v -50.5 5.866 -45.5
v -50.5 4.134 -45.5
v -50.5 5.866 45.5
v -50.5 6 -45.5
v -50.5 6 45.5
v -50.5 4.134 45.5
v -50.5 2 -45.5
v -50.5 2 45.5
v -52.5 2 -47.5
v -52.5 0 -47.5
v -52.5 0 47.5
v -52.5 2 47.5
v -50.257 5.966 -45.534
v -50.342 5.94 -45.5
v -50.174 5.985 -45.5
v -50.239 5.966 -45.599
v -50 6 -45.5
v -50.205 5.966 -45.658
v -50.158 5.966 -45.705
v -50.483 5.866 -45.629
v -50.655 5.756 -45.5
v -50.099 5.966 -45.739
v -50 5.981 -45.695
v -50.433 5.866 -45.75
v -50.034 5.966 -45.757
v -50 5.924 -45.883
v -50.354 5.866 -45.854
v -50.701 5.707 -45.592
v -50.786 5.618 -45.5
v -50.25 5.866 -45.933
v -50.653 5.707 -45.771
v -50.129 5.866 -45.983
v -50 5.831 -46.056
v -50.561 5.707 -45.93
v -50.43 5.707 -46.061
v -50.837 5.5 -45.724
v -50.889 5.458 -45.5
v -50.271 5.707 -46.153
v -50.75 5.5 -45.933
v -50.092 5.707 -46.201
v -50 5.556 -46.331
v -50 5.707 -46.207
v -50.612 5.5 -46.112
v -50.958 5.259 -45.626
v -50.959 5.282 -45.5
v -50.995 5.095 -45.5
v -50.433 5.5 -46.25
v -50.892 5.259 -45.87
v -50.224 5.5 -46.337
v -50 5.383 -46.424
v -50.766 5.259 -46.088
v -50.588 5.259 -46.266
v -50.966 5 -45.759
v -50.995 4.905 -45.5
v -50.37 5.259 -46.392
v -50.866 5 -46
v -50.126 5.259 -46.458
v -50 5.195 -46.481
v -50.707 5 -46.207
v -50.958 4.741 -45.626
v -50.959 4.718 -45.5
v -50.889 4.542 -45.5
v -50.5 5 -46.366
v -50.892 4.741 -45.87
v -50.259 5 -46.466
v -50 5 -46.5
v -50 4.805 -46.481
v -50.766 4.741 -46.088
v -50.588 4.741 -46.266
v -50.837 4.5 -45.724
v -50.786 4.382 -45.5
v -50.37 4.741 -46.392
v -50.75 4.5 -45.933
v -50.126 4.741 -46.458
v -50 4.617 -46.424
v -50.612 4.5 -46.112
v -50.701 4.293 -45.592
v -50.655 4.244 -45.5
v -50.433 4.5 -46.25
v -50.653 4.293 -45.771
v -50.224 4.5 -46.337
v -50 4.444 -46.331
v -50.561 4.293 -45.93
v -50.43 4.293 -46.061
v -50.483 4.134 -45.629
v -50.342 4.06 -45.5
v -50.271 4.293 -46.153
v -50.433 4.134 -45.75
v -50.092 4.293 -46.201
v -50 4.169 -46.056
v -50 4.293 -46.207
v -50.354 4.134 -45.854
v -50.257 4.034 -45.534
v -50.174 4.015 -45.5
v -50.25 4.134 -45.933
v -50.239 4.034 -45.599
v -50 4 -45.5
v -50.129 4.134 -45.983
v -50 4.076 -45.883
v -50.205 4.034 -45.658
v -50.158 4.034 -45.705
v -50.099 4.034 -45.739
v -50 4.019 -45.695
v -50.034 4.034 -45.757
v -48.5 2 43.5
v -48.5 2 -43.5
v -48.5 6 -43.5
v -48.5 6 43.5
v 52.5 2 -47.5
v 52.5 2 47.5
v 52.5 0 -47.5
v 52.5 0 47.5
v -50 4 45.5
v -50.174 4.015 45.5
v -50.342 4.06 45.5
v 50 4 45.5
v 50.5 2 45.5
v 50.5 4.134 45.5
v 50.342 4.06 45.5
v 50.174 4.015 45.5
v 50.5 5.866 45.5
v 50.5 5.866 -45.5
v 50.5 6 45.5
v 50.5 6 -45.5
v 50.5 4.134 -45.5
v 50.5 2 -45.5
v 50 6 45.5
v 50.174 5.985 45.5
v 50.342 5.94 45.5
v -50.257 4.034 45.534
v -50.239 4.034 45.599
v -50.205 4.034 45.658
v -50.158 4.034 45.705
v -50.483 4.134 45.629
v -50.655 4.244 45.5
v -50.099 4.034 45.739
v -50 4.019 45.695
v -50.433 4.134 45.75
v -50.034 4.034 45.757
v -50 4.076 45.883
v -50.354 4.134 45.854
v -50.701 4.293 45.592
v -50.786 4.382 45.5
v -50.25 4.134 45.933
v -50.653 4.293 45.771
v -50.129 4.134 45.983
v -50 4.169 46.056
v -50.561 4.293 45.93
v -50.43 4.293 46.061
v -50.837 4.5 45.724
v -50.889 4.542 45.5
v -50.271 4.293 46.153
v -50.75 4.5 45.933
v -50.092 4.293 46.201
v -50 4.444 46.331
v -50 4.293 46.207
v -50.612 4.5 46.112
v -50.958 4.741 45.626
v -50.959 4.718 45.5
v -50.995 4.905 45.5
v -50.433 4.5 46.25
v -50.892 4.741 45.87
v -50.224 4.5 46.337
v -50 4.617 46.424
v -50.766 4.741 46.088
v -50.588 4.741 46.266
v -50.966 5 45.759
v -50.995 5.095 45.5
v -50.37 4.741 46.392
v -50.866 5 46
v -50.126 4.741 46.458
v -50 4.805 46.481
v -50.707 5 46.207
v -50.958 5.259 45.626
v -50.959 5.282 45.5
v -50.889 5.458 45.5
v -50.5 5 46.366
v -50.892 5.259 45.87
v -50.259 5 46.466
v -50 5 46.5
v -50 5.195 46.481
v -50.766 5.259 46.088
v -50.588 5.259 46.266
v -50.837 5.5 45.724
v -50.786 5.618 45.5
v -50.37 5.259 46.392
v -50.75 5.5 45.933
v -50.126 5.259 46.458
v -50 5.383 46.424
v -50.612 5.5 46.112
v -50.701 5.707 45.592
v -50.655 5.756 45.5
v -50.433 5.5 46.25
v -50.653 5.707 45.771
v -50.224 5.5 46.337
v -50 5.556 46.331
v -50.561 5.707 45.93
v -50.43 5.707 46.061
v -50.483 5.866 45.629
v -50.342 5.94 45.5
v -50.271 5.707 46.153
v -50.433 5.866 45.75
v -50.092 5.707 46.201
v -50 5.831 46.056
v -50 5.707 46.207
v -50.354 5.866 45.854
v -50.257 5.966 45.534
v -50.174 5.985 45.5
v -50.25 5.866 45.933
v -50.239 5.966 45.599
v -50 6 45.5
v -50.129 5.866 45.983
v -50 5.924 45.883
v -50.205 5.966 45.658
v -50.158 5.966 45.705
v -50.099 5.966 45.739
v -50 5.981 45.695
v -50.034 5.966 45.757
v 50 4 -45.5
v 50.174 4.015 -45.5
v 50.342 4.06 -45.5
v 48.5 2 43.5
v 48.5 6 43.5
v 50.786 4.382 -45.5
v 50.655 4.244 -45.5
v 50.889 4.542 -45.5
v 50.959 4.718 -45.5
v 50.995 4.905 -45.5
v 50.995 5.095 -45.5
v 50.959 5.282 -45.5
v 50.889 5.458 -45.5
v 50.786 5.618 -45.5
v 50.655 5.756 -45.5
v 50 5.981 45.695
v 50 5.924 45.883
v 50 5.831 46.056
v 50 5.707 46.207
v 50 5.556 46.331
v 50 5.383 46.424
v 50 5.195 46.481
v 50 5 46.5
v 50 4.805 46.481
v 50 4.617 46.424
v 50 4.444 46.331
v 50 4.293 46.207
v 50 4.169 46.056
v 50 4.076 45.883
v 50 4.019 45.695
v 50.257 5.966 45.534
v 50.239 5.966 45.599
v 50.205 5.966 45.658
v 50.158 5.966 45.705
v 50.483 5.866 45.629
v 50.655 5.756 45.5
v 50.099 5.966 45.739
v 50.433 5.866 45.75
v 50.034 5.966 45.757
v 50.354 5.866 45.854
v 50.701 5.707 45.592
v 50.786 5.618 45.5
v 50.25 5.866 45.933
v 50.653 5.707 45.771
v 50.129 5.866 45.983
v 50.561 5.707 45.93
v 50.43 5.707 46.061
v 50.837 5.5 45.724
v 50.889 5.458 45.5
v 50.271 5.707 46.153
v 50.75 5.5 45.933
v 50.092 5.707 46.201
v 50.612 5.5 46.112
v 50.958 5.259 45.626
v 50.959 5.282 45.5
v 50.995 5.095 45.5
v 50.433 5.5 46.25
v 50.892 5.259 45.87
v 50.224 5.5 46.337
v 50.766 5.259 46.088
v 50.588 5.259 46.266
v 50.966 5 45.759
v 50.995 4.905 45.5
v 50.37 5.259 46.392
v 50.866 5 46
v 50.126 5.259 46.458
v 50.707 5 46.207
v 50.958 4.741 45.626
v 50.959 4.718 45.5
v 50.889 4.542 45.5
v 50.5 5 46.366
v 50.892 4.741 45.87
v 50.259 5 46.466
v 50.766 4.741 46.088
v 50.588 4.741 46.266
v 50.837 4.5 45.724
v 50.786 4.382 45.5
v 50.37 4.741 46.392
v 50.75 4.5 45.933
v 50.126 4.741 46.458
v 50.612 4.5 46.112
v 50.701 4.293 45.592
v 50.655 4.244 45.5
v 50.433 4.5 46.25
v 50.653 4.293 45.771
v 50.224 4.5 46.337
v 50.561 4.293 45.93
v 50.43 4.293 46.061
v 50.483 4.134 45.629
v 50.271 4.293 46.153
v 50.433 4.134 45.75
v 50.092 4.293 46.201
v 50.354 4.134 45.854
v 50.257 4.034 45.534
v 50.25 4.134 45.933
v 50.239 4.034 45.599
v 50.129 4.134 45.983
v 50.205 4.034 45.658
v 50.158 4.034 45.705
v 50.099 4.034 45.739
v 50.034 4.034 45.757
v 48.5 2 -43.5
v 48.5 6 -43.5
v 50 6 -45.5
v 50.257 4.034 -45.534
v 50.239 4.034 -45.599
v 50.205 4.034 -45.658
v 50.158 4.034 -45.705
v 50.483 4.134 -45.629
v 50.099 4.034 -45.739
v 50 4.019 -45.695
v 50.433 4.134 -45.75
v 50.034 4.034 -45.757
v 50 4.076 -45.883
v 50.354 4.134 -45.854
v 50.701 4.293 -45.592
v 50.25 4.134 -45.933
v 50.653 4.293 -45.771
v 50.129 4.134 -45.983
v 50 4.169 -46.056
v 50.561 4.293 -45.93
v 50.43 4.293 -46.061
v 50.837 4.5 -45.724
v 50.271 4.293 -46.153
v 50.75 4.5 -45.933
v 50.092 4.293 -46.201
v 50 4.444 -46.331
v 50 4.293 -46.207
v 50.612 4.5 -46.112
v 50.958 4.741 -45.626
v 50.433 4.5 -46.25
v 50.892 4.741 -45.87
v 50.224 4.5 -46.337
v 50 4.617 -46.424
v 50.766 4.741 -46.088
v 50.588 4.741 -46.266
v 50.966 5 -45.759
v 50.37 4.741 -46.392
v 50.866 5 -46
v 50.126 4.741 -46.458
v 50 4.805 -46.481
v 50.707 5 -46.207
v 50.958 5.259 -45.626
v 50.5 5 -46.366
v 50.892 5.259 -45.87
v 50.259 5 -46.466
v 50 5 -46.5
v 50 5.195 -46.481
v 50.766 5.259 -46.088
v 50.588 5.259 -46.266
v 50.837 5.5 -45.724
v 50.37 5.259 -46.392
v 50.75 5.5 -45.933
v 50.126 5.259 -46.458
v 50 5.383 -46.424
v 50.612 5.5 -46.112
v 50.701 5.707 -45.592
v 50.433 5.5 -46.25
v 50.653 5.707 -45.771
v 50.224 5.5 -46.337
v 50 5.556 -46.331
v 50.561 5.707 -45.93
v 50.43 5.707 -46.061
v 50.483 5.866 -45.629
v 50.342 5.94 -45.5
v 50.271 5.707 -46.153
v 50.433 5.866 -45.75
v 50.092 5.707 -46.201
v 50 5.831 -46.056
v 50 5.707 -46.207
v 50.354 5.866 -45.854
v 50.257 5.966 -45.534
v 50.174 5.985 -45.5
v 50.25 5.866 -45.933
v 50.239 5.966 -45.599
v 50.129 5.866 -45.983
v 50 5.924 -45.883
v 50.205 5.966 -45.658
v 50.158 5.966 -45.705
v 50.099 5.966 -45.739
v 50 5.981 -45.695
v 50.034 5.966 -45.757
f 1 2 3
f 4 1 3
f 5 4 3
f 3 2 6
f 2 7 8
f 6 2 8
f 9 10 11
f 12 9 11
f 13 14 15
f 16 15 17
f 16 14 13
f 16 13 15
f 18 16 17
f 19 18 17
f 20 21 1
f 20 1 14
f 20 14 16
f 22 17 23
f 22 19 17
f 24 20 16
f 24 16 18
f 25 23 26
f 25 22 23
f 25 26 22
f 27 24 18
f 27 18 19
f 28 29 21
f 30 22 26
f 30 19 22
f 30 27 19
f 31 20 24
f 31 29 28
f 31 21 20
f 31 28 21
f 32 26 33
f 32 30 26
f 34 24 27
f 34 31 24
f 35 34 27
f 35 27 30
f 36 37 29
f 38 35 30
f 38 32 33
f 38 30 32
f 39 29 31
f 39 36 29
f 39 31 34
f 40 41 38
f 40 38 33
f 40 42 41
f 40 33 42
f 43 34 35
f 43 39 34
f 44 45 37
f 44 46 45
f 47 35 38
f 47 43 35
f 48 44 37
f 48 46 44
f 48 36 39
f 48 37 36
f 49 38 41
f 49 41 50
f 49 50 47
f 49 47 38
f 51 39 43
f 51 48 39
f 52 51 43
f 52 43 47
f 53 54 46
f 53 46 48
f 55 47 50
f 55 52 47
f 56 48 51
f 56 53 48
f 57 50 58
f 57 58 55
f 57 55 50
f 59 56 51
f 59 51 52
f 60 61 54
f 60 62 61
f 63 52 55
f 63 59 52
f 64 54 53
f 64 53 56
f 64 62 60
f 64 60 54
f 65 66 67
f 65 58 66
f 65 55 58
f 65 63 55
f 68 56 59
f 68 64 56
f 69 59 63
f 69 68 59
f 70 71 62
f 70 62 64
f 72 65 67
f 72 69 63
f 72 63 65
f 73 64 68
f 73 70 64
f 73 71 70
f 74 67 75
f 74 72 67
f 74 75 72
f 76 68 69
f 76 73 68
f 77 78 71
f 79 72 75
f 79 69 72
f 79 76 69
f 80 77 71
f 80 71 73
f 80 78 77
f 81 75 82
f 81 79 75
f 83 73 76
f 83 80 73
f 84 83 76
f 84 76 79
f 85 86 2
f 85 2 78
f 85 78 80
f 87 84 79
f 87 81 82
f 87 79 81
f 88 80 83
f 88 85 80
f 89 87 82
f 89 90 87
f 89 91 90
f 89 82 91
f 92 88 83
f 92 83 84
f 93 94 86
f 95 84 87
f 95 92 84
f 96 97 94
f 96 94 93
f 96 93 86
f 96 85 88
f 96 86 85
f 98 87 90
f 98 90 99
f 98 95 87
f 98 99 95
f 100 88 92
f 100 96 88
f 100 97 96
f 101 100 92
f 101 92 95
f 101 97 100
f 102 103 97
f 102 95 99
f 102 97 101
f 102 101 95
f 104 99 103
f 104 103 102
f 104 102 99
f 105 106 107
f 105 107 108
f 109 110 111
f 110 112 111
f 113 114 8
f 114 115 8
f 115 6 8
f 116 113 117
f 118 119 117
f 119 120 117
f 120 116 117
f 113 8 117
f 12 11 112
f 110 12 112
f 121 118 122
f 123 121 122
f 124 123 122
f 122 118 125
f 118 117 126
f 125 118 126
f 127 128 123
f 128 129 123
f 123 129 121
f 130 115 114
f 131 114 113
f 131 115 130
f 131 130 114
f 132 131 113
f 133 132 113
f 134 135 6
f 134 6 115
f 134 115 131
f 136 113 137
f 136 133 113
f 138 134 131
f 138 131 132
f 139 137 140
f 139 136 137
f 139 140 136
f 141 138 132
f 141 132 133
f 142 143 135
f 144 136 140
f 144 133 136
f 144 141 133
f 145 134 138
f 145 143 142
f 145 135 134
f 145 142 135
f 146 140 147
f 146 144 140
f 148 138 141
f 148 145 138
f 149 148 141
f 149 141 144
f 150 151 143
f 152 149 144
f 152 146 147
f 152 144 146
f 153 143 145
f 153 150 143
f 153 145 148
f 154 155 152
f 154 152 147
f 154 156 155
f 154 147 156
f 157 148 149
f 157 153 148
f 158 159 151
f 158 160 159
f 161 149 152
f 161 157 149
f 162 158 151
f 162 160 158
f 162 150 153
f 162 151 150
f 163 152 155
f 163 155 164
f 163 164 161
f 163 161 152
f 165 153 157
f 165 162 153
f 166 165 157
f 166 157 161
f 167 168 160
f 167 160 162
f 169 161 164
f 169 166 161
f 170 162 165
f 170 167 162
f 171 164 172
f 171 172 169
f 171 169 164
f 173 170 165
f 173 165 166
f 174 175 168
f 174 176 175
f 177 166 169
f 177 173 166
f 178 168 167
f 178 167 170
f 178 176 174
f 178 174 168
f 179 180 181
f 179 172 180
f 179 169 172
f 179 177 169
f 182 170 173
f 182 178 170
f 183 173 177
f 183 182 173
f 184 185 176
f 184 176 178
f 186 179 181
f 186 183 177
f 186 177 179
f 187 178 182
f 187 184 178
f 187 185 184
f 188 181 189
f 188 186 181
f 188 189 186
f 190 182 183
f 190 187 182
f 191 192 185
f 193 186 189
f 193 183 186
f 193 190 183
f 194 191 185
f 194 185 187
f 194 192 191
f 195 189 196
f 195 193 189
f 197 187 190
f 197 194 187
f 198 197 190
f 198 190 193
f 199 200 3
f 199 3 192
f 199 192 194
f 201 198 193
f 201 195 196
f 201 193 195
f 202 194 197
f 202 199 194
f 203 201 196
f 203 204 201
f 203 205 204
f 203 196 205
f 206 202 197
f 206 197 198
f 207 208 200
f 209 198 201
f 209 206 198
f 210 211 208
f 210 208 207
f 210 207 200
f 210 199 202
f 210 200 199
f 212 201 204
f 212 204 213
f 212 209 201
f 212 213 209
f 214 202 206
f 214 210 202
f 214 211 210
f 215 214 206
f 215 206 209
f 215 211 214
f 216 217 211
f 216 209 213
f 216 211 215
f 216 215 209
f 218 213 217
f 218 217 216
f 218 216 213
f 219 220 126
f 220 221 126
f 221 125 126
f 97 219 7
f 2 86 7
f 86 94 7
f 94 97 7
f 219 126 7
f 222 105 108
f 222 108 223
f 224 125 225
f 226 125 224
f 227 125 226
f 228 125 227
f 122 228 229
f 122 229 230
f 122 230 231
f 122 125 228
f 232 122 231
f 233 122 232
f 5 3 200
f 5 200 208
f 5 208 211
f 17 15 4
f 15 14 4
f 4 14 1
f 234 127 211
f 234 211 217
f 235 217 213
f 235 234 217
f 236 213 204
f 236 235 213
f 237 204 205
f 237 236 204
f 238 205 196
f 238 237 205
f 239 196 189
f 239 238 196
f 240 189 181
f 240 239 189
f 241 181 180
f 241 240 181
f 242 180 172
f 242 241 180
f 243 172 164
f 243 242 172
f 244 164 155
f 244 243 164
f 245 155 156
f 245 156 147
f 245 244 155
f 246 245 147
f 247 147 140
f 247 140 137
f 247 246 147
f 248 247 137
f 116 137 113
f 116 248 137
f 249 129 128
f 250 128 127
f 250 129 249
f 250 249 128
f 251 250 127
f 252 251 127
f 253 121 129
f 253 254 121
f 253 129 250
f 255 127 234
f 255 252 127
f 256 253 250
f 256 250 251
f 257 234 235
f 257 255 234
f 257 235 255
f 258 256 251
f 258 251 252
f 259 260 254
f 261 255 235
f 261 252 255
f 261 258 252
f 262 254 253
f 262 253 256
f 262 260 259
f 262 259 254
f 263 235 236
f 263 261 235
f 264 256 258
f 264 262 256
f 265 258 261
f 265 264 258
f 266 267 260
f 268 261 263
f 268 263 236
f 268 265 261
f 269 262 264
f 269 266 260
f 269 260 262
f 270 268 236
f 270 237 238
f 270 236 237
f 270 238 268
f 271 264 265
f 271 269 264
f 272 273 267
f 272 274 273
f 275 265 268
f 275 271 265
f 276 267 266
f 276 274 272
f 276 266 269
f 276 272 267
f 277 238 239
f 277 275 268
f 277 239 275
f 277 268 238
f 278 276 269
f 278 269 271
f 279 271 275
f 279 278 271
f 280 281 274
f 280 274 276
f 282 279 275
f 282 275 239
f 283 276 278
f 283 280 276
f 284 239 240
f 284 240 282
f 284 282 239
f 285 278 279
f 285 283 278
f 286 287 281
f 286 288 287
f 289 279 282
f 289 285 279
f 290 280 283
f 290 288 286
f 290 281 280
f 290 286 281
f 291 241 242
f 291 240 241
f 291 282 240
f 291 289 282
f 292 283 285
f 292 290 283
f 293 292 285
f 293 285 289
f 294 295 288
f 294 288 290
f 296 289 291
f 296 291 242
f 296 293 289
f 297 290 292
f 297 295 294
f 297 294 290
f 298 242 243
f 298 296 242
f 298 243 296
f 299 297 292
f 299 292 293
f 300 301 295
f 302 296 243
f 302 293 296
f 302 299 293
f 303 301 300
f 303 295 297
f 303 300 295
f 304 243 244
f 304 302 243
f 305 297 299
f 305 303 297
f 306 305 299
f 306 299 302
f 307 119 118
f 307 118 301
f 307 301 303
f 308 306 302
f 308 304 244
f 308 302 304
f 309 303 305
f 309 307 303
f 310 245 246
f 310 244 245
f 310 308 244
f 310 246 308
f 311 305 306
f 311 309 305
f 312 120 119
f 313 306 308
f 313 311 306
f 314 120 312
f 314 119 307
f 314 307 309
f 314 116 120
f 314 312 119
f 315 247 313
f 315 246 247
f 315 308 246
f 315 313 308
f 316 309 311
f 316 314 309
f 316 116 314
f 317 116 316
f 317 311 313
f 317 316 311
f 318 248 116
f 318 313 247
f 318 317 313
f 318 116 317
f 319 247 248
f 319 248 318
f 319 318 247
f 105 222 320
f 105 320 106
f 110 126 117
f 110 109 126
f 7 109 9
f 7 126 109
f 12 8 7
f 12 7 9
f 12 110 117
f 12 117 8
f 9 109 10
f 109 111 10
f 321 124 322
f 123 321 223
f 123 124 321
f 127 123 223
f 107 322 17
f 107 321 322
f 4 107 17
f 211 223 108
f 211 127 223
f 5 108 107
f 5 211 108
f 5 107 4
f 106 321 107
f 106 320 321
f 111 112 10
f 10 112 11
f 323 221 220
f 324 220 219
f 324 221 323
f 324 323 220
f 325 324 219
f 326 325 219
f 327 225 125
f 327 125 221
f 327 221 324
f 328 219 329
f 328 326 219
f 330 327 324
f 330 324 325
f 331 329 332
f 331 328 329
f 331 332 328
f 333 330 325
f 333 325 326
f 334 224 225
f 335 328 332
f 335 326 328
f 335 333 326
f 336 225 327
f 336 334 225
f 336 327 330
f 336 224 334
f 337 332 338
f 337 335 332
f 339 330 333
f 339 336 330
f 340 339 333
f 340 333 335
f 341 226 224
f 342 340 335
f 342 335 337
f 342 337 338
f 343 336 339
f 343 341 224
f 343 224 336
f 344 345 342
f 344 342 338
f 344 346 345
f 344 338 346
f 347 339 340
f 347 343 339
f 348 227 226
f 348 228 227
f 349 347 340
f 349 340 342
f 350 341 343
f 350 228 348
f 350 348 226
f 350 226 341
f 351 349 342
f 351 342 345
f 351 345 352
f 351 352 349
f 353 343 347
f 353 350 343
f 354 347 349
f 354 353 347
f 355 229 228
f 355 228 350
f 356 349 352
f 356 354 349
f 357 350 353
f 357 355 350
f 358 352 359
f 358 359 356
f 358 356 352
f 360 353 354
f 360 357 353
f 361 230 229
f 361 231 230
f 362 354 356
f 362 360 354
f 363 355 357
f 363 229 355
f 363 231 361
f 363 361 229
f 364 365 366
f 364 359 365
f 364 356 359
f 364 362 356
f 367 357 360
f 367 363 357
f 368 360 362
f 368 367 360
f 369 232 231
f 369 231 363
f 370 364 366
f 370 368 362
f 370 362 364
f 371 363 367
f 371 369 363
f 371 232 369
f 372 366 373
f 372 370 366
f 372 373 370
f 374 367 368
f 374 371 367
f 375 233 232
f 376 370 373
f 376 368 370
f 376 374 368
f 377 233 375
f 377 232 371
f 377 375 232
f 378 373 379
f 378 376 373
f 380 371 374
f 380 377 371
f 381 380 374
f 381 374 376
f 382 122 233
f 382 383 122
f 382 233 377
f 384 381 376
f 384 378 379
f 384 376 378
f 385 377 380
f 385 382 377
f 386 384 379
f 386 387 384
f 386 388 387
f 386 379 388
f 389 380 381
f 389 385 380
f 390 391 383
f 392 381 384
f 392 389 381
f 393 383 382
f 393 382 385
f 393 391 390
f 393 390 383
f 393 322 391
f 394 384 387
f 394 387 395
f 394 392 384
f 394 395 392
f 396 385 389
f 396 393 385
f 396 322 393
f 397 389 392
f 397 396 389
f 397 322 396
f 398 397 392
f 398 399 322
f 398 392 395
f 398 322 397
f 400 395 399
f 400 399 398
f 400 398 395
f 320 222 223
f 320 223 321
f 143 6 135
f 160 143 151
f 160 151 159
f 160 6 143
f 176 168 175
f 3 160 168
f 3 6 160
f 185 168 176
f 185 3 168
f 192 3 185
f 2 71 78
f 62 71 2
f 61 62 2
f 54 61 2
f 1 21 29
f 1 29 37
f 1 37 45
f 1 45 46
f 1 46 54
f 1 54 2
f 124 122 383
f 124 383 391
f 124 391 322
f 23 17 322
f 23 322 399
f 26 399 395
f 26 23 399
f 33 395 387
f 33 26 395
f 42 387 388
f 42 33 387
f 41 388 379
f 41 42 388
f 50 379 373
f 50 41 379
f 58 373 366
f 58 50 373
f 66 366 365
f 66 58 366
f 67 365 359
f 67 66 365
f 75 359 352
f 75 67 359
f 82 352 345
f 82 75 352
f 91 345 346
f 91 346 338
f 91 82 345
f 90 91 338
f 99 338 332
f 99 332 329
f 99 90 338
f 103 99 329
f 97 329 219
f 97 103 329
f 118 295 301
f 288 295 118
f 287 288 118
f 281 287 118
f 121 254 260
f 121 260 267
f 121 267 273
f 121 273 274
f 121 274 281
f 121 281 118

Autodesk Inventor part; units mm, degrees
ref_plane "YZ Plane" through (0, 0, 0) normal (1, 0, 0) x (0, 1, 0)
ref_plane "XZ Plane" through (0, 0, 0) normal (0, 1, 0) x (-1, 0, 0)
ref_plane "XY Plane" through (0, 0, 0) normal (0, 0, 1) x (1, 0, 0)
sketch "Master_XZ" plane through (0, 0, 0) normal (0, 1, 0) x (-1, 0, 0)
  line L0 (52.5, 47.5) -> (-52.5, 47.5)
  line L1 (-52.5, 47.5) -> (-52.5, -47.5)
  line L2 (-52.5, -47.5) -> (52.5, -47.5)
  line L3 (52.5, -47.5) -> (52.5, 47.5)
  line L4 (52.5, 47.5) -> (-52.5, -47.5) construction
  line L5 (-52.5, 47.5) -> (52.5, -47.5) construction
  line L6 (50.5, 45.5) -> (-50.5, 45.5)
  line L7 (-50.5, 45.5) -> (-50.5, -45.5)
  line L8 (-50.5, -45.5) -> (50.5, -45.5)
  line L9 (50.5, -45.5) -> (50.5, 45.5)
  line L10 (48.5, 43.5) -> (-48.5, 43.5)
  line L11 (-48.5, 43.5) -> (-48.5, -43.5)
  line L12 (-48.5, -43.5) -> (48.5, -43.5)
  line L13 (48.5, -43.5) -> (48.5, 43.5)
  point P0 (0, 0)
  dimension "d0" = 2
  dimension "d1" = 2
  dimension "d10" = 105
  dimension "d15" = 95
extrude "Floor" add sketch "Master_XZ" along normal blind 2 contours L3 L2 L1 L0 | L9 L8 L7 L6 | L13 L12 L11 L10
extrude "Walls" add sketch "Master_XZ" along normal blind 6 contours L9 L8 L7 L6
sketch "Lip_profile" plane through (0, 1, -41.5) normal (1, 0, 0) x (0, 0, -1)
  line L0 (-87, 1) -> (-87, 5) projected
  circle A0 centre (-87, 4) radius 1
  line L1 (-87, 5) -> (4, 5) projected
  line L2 (-87, 5) -> (-87, 3)
  point P0 (-41.5, -1)
  dimension "d6" = 2
  dimension "d7" = 1
extrude "Lip" add sketch "Lip_profile" along normal mid plane 100
sketch "Sketch3" plane through (50, 1, -41.5) normal (1, 0, 0) x (0, 0, -1)
  line L0 (-87, 5) -> (-87, 3) projected
  line L1 (-87, 5) -> (-87, 3) projected
  arc A0 (-87, 5) -> (-87, 3) centre (-87, 4) ccw projected
  point P0 (-41.5, -1)
revolve "Lip_edge_right" add sketch "Sketch3" angle 90 about axis through (50, 6, 45.5) along (0, 1, 0)
sketch "Sketch4" plane through (-50, 1, -41.5) normal (-1, 0, 0) x (0, 0, 1)
  line L0 (87, 3) -> (87, 5) projected
  arc A0 (87, 3) -> (87, 5) centre (87, 4) ccw projected
  point P0 (41.5, -1)
revolve "Lip_edge_left" add sketch "Sketch4" angle 90 about axis through (-50, 4, 45.5) along (0, -1, 0)
pattern_circular "Circular Pattern1" count 2 over 360 about axis through (0, -10, 0) along (0, 1, 0) of "Lip", "Lip_edge_right", "Lip_edge_left"
properties part number "BARB_bottom" material "ABS Plastic"
